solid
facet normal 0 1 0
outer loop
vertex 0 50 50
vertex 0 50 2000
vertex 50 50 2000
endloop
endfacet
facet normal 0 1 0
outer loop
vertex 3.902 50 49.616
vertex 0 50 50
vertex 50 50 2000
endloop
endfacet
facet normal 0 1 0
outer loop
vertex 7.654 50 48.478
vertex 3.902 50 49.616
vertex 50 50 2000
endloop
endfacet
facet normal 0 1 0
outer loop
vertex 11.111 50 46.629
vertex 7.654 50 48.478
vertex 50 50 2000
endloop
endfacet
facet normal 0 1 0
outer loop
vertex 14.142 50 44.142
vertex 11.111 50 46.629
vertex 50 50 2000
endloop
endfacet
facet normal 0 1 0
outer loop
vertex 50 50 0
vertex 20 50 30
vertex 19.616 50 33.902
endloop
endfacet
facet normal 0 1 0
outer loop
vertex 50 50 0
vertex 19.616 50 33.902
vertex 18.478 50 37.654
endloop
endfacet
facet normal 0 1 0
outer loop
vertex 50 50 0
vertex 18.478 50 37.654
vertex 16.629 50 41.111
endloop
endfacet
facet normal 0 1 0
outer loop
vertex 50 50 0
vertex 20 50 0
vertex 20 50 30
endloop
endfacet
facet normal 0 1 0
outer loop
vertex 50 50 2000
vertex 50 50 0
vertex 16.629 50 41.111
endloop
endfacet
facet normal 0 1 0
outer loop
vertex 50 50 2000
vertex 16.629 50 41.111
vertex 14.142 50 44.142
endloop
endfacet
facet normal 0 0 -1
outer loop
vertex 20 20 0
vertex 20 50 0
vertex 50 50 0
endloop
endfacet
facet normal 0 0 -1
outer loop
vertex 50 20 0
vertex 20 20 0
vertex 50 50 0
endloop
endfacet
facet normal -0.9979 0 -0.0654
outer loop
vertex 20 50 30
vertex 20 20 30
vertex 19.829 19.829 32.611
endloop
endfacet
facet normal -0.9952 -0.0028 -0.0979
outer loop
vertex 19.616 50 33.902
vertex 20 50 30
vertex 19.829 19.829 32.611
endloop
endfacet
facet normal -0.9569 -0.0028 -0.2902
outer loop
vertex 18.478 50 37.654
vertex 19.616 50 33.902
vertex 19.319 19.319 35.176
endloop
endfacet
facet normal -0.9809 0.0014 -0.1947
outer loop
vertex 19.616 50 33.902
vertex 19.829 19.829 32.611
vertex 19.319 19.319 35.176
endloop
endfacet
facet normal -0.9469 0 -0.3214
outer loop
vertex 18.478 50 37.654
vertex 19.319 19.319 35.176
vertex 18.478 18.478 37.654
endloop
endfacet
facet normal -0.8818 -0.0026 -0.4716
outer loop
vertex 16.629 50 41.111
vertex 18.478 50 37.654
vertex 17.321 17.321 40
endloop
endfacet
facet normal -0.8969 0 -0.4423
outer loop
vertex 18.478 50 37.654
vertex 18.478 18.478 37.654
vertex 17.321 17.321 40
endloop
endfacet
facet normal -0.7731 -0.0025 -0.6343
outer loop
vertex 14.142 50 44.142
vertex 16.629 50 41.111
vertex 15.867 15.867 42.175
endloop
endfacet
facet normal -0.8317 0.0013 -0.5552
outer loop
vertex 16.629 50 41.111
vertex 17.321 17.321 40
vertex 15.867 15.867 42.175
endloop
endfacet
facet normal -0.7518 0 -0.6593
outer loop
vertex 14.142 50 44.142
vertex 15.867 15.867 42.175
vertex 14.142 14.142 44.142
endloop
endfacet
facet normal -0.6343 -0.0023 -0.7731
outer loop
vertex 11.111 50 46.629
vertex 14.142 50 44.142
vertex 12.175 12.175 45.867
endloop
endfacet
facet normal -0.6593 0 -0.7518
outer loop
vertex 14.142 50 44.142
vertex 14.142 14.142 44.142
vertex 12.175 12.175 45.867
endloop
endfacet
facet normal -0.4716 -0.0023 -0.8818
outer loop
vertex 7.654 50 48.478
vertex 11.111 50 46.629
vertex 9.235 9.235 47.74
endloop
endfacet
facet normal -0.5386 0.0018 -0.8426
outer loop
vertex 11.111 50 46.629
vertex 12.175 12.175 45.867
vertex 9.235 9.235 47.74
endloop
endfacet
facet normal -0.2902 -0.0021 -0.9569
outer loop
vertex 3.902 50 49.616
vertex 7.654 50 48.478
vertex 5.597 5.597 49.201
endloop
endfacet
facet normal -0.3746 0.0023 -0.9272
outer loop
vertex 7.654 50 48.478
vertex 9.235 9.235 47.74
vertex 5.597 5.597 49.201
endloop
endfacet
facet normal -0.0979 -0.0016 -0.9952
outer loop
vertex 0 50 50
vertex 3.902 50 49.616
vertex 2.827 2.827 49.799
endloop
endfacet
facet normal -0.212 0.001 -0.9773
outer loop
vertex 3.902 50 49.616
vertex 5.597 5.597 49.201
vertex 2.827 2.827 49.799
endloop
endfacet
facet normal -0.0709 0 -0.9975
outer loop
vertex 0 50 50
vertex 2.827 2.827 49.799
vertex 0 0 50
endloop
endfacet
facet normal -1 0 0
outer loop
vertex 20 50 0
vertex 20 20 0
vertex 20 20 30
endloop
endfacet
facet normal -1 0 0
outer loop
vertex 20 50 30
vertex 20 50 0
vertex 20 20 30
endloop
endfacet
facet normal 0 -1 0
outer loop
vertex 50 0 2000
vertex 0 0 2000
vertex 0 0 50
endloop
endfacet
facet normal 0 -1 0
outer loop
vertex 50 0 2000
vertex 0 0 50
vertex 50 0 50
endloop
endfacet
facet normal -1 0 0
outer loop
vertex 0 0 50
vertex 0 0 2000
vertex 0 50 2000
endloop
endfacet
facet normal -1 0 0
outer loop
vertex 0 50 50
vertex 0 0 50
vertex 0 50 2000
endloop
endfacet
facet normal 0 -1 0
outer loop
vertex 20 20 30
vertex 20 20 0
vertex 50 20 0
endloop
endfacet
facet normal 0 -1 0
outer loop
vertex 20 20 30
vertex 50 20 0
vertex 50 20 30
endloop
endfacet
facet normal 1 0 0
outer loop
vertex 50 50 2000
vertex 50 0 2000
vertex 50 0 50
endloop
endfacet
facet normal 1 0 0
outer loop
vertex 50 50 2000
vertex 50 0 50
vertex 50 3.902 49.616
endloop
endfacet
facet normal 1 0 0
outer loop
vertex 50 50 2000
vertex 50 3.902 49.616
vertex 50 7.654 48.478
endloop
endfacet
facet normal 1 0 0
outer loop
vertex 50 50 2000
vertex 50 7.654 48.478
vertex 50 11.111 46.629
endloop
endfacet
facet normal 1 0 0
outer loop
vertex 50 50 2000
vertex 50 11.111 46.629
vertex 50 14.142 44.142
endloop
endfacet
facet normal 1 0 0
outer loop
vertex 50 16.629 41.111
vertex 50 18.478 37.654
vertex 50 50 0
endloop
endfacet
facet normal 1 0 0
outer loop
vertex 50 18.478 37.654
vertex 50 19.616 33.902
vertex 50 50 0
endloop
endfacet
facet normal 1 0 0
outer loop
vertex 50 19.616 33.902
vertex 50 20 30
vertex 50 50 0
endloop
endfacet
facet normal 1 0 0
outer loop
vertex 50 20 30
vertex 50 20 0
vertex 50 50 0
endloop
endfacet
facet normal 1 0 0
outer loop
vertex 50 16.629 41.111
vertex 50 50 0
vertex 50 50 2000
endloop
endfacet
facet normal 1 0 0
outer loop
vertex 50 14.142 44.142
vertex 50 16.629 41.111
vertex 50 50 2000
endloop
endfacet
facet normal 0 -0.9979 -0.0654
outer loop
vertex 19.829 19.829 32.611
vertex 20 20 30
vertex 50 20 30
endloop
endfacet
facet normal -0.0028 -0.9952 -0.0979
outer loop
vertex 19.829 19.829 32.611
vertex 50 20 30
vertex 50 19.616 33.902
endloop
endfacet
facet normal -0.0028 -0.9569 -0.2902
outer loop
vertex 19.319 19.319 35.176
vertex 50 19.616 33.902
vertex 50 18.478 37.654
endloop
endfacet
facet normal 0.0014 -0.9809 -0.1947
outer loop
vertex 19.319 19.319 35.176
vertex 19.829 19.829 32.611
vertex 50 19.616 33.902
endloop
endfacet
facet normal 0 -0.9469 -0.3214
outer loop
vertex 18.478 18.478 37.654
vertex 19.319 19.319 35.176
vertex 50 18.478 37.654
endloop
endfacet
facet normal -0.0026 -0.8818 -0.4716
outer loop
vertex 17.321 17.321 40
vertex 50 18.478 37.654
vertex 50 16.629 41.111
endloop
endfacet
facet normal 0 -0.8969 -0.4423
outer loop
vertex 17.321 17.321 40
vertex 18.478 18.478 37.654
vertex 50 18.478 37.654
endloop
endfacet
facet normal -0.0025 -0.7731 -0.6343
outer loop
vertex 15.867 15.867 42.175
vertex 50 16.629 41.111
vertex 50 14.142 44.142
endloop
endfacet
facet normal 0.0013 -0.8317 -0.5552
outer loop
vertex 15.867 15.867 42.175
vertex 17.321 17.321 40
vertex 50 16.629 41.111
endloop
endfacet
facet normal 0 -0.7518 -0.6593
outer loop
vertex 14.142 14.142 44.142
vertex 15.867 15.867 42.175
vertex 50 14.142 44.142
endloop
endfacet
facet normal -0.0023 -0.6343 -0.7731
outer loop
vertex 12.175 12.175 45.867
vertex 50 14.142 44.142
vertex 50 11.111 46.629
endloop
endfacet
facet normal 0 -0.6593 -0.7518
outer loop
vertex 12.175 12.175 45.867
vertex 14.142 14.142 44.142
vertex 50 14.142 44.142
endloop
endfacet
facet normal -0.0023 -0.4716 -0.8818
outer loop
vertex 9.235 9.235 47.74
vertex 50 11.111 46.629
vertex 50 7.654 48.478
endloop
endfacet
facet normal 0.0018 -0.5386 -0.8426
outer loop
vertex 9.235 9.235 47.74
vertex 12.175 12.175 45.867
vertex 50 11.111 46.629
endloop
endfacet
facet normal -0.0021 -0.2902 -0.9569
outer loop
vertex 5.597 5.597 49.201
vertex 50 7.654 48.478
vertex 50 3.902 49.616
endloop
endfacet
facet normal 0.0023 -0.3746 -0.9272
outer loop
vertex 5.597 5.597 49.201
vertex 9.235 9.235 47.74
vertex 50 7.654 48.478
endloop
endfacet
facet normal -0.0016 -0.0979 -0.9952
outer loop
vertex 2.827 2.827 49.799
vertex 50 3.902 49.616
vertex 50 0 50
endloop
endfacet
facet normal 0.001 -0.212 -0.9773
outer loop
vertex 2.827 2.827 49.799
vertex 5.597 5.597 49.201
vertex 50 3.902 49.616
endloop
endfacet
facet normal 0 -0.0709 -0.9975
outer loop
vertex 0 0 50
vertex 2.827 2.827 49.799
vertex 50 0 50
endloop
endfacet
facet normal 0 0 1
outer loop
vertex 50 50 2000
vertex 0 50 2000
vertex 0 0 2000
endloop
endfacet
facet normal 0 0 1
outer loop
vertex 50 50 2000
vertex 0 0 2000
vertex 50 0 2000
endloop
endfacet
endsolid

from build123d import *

# Parameters (mm, degrees)
F0_W     = 50
F0_H     = 50
F1_DEPTH = 2000
F3_DEPTH = 50.001
F5_DEPTH = 50.001


with BuildPart() as f1:
    # F0 (on Top) → F1 (new body)
    with BuildSketch(Plane.XY):
        with Locations((25, 25)):
            Rectangle(F0_W, F0_H)
    extrude(amount=F1_DEPTH)

    # F2 (on Front) → F3 (cut, through all)
    with BuildSketch(Plane.XZ):
        with BuildLine():
            Line((0, 50), (0, 0))
            Line((0, 0), (20, 0))
            Line((20, 0), (20, 30))
            ThreePointArc((20, 30), (14.142136, 44.142136), (0, 50))
        make_face()
    extrude(amount=-F3_DEPTH, mode=Mode.SUBTRACT)

    # F4 (on Right) → F5 (cut, through all)
    with BuildSketch(Plane.YZ):
        with BuildLine():
            Line((0, 50), (0, 0))
            Line((0, 0), (20, 0))
            Line((20, 0), (20, 30))
            ThreePointArc((20, 30), (14.142136, 44.142136), (0, 50))
        make_face()
    extrude(amount=F5_DEPTH, mode=Mode.SUBTRACT)


solid = f1.part
